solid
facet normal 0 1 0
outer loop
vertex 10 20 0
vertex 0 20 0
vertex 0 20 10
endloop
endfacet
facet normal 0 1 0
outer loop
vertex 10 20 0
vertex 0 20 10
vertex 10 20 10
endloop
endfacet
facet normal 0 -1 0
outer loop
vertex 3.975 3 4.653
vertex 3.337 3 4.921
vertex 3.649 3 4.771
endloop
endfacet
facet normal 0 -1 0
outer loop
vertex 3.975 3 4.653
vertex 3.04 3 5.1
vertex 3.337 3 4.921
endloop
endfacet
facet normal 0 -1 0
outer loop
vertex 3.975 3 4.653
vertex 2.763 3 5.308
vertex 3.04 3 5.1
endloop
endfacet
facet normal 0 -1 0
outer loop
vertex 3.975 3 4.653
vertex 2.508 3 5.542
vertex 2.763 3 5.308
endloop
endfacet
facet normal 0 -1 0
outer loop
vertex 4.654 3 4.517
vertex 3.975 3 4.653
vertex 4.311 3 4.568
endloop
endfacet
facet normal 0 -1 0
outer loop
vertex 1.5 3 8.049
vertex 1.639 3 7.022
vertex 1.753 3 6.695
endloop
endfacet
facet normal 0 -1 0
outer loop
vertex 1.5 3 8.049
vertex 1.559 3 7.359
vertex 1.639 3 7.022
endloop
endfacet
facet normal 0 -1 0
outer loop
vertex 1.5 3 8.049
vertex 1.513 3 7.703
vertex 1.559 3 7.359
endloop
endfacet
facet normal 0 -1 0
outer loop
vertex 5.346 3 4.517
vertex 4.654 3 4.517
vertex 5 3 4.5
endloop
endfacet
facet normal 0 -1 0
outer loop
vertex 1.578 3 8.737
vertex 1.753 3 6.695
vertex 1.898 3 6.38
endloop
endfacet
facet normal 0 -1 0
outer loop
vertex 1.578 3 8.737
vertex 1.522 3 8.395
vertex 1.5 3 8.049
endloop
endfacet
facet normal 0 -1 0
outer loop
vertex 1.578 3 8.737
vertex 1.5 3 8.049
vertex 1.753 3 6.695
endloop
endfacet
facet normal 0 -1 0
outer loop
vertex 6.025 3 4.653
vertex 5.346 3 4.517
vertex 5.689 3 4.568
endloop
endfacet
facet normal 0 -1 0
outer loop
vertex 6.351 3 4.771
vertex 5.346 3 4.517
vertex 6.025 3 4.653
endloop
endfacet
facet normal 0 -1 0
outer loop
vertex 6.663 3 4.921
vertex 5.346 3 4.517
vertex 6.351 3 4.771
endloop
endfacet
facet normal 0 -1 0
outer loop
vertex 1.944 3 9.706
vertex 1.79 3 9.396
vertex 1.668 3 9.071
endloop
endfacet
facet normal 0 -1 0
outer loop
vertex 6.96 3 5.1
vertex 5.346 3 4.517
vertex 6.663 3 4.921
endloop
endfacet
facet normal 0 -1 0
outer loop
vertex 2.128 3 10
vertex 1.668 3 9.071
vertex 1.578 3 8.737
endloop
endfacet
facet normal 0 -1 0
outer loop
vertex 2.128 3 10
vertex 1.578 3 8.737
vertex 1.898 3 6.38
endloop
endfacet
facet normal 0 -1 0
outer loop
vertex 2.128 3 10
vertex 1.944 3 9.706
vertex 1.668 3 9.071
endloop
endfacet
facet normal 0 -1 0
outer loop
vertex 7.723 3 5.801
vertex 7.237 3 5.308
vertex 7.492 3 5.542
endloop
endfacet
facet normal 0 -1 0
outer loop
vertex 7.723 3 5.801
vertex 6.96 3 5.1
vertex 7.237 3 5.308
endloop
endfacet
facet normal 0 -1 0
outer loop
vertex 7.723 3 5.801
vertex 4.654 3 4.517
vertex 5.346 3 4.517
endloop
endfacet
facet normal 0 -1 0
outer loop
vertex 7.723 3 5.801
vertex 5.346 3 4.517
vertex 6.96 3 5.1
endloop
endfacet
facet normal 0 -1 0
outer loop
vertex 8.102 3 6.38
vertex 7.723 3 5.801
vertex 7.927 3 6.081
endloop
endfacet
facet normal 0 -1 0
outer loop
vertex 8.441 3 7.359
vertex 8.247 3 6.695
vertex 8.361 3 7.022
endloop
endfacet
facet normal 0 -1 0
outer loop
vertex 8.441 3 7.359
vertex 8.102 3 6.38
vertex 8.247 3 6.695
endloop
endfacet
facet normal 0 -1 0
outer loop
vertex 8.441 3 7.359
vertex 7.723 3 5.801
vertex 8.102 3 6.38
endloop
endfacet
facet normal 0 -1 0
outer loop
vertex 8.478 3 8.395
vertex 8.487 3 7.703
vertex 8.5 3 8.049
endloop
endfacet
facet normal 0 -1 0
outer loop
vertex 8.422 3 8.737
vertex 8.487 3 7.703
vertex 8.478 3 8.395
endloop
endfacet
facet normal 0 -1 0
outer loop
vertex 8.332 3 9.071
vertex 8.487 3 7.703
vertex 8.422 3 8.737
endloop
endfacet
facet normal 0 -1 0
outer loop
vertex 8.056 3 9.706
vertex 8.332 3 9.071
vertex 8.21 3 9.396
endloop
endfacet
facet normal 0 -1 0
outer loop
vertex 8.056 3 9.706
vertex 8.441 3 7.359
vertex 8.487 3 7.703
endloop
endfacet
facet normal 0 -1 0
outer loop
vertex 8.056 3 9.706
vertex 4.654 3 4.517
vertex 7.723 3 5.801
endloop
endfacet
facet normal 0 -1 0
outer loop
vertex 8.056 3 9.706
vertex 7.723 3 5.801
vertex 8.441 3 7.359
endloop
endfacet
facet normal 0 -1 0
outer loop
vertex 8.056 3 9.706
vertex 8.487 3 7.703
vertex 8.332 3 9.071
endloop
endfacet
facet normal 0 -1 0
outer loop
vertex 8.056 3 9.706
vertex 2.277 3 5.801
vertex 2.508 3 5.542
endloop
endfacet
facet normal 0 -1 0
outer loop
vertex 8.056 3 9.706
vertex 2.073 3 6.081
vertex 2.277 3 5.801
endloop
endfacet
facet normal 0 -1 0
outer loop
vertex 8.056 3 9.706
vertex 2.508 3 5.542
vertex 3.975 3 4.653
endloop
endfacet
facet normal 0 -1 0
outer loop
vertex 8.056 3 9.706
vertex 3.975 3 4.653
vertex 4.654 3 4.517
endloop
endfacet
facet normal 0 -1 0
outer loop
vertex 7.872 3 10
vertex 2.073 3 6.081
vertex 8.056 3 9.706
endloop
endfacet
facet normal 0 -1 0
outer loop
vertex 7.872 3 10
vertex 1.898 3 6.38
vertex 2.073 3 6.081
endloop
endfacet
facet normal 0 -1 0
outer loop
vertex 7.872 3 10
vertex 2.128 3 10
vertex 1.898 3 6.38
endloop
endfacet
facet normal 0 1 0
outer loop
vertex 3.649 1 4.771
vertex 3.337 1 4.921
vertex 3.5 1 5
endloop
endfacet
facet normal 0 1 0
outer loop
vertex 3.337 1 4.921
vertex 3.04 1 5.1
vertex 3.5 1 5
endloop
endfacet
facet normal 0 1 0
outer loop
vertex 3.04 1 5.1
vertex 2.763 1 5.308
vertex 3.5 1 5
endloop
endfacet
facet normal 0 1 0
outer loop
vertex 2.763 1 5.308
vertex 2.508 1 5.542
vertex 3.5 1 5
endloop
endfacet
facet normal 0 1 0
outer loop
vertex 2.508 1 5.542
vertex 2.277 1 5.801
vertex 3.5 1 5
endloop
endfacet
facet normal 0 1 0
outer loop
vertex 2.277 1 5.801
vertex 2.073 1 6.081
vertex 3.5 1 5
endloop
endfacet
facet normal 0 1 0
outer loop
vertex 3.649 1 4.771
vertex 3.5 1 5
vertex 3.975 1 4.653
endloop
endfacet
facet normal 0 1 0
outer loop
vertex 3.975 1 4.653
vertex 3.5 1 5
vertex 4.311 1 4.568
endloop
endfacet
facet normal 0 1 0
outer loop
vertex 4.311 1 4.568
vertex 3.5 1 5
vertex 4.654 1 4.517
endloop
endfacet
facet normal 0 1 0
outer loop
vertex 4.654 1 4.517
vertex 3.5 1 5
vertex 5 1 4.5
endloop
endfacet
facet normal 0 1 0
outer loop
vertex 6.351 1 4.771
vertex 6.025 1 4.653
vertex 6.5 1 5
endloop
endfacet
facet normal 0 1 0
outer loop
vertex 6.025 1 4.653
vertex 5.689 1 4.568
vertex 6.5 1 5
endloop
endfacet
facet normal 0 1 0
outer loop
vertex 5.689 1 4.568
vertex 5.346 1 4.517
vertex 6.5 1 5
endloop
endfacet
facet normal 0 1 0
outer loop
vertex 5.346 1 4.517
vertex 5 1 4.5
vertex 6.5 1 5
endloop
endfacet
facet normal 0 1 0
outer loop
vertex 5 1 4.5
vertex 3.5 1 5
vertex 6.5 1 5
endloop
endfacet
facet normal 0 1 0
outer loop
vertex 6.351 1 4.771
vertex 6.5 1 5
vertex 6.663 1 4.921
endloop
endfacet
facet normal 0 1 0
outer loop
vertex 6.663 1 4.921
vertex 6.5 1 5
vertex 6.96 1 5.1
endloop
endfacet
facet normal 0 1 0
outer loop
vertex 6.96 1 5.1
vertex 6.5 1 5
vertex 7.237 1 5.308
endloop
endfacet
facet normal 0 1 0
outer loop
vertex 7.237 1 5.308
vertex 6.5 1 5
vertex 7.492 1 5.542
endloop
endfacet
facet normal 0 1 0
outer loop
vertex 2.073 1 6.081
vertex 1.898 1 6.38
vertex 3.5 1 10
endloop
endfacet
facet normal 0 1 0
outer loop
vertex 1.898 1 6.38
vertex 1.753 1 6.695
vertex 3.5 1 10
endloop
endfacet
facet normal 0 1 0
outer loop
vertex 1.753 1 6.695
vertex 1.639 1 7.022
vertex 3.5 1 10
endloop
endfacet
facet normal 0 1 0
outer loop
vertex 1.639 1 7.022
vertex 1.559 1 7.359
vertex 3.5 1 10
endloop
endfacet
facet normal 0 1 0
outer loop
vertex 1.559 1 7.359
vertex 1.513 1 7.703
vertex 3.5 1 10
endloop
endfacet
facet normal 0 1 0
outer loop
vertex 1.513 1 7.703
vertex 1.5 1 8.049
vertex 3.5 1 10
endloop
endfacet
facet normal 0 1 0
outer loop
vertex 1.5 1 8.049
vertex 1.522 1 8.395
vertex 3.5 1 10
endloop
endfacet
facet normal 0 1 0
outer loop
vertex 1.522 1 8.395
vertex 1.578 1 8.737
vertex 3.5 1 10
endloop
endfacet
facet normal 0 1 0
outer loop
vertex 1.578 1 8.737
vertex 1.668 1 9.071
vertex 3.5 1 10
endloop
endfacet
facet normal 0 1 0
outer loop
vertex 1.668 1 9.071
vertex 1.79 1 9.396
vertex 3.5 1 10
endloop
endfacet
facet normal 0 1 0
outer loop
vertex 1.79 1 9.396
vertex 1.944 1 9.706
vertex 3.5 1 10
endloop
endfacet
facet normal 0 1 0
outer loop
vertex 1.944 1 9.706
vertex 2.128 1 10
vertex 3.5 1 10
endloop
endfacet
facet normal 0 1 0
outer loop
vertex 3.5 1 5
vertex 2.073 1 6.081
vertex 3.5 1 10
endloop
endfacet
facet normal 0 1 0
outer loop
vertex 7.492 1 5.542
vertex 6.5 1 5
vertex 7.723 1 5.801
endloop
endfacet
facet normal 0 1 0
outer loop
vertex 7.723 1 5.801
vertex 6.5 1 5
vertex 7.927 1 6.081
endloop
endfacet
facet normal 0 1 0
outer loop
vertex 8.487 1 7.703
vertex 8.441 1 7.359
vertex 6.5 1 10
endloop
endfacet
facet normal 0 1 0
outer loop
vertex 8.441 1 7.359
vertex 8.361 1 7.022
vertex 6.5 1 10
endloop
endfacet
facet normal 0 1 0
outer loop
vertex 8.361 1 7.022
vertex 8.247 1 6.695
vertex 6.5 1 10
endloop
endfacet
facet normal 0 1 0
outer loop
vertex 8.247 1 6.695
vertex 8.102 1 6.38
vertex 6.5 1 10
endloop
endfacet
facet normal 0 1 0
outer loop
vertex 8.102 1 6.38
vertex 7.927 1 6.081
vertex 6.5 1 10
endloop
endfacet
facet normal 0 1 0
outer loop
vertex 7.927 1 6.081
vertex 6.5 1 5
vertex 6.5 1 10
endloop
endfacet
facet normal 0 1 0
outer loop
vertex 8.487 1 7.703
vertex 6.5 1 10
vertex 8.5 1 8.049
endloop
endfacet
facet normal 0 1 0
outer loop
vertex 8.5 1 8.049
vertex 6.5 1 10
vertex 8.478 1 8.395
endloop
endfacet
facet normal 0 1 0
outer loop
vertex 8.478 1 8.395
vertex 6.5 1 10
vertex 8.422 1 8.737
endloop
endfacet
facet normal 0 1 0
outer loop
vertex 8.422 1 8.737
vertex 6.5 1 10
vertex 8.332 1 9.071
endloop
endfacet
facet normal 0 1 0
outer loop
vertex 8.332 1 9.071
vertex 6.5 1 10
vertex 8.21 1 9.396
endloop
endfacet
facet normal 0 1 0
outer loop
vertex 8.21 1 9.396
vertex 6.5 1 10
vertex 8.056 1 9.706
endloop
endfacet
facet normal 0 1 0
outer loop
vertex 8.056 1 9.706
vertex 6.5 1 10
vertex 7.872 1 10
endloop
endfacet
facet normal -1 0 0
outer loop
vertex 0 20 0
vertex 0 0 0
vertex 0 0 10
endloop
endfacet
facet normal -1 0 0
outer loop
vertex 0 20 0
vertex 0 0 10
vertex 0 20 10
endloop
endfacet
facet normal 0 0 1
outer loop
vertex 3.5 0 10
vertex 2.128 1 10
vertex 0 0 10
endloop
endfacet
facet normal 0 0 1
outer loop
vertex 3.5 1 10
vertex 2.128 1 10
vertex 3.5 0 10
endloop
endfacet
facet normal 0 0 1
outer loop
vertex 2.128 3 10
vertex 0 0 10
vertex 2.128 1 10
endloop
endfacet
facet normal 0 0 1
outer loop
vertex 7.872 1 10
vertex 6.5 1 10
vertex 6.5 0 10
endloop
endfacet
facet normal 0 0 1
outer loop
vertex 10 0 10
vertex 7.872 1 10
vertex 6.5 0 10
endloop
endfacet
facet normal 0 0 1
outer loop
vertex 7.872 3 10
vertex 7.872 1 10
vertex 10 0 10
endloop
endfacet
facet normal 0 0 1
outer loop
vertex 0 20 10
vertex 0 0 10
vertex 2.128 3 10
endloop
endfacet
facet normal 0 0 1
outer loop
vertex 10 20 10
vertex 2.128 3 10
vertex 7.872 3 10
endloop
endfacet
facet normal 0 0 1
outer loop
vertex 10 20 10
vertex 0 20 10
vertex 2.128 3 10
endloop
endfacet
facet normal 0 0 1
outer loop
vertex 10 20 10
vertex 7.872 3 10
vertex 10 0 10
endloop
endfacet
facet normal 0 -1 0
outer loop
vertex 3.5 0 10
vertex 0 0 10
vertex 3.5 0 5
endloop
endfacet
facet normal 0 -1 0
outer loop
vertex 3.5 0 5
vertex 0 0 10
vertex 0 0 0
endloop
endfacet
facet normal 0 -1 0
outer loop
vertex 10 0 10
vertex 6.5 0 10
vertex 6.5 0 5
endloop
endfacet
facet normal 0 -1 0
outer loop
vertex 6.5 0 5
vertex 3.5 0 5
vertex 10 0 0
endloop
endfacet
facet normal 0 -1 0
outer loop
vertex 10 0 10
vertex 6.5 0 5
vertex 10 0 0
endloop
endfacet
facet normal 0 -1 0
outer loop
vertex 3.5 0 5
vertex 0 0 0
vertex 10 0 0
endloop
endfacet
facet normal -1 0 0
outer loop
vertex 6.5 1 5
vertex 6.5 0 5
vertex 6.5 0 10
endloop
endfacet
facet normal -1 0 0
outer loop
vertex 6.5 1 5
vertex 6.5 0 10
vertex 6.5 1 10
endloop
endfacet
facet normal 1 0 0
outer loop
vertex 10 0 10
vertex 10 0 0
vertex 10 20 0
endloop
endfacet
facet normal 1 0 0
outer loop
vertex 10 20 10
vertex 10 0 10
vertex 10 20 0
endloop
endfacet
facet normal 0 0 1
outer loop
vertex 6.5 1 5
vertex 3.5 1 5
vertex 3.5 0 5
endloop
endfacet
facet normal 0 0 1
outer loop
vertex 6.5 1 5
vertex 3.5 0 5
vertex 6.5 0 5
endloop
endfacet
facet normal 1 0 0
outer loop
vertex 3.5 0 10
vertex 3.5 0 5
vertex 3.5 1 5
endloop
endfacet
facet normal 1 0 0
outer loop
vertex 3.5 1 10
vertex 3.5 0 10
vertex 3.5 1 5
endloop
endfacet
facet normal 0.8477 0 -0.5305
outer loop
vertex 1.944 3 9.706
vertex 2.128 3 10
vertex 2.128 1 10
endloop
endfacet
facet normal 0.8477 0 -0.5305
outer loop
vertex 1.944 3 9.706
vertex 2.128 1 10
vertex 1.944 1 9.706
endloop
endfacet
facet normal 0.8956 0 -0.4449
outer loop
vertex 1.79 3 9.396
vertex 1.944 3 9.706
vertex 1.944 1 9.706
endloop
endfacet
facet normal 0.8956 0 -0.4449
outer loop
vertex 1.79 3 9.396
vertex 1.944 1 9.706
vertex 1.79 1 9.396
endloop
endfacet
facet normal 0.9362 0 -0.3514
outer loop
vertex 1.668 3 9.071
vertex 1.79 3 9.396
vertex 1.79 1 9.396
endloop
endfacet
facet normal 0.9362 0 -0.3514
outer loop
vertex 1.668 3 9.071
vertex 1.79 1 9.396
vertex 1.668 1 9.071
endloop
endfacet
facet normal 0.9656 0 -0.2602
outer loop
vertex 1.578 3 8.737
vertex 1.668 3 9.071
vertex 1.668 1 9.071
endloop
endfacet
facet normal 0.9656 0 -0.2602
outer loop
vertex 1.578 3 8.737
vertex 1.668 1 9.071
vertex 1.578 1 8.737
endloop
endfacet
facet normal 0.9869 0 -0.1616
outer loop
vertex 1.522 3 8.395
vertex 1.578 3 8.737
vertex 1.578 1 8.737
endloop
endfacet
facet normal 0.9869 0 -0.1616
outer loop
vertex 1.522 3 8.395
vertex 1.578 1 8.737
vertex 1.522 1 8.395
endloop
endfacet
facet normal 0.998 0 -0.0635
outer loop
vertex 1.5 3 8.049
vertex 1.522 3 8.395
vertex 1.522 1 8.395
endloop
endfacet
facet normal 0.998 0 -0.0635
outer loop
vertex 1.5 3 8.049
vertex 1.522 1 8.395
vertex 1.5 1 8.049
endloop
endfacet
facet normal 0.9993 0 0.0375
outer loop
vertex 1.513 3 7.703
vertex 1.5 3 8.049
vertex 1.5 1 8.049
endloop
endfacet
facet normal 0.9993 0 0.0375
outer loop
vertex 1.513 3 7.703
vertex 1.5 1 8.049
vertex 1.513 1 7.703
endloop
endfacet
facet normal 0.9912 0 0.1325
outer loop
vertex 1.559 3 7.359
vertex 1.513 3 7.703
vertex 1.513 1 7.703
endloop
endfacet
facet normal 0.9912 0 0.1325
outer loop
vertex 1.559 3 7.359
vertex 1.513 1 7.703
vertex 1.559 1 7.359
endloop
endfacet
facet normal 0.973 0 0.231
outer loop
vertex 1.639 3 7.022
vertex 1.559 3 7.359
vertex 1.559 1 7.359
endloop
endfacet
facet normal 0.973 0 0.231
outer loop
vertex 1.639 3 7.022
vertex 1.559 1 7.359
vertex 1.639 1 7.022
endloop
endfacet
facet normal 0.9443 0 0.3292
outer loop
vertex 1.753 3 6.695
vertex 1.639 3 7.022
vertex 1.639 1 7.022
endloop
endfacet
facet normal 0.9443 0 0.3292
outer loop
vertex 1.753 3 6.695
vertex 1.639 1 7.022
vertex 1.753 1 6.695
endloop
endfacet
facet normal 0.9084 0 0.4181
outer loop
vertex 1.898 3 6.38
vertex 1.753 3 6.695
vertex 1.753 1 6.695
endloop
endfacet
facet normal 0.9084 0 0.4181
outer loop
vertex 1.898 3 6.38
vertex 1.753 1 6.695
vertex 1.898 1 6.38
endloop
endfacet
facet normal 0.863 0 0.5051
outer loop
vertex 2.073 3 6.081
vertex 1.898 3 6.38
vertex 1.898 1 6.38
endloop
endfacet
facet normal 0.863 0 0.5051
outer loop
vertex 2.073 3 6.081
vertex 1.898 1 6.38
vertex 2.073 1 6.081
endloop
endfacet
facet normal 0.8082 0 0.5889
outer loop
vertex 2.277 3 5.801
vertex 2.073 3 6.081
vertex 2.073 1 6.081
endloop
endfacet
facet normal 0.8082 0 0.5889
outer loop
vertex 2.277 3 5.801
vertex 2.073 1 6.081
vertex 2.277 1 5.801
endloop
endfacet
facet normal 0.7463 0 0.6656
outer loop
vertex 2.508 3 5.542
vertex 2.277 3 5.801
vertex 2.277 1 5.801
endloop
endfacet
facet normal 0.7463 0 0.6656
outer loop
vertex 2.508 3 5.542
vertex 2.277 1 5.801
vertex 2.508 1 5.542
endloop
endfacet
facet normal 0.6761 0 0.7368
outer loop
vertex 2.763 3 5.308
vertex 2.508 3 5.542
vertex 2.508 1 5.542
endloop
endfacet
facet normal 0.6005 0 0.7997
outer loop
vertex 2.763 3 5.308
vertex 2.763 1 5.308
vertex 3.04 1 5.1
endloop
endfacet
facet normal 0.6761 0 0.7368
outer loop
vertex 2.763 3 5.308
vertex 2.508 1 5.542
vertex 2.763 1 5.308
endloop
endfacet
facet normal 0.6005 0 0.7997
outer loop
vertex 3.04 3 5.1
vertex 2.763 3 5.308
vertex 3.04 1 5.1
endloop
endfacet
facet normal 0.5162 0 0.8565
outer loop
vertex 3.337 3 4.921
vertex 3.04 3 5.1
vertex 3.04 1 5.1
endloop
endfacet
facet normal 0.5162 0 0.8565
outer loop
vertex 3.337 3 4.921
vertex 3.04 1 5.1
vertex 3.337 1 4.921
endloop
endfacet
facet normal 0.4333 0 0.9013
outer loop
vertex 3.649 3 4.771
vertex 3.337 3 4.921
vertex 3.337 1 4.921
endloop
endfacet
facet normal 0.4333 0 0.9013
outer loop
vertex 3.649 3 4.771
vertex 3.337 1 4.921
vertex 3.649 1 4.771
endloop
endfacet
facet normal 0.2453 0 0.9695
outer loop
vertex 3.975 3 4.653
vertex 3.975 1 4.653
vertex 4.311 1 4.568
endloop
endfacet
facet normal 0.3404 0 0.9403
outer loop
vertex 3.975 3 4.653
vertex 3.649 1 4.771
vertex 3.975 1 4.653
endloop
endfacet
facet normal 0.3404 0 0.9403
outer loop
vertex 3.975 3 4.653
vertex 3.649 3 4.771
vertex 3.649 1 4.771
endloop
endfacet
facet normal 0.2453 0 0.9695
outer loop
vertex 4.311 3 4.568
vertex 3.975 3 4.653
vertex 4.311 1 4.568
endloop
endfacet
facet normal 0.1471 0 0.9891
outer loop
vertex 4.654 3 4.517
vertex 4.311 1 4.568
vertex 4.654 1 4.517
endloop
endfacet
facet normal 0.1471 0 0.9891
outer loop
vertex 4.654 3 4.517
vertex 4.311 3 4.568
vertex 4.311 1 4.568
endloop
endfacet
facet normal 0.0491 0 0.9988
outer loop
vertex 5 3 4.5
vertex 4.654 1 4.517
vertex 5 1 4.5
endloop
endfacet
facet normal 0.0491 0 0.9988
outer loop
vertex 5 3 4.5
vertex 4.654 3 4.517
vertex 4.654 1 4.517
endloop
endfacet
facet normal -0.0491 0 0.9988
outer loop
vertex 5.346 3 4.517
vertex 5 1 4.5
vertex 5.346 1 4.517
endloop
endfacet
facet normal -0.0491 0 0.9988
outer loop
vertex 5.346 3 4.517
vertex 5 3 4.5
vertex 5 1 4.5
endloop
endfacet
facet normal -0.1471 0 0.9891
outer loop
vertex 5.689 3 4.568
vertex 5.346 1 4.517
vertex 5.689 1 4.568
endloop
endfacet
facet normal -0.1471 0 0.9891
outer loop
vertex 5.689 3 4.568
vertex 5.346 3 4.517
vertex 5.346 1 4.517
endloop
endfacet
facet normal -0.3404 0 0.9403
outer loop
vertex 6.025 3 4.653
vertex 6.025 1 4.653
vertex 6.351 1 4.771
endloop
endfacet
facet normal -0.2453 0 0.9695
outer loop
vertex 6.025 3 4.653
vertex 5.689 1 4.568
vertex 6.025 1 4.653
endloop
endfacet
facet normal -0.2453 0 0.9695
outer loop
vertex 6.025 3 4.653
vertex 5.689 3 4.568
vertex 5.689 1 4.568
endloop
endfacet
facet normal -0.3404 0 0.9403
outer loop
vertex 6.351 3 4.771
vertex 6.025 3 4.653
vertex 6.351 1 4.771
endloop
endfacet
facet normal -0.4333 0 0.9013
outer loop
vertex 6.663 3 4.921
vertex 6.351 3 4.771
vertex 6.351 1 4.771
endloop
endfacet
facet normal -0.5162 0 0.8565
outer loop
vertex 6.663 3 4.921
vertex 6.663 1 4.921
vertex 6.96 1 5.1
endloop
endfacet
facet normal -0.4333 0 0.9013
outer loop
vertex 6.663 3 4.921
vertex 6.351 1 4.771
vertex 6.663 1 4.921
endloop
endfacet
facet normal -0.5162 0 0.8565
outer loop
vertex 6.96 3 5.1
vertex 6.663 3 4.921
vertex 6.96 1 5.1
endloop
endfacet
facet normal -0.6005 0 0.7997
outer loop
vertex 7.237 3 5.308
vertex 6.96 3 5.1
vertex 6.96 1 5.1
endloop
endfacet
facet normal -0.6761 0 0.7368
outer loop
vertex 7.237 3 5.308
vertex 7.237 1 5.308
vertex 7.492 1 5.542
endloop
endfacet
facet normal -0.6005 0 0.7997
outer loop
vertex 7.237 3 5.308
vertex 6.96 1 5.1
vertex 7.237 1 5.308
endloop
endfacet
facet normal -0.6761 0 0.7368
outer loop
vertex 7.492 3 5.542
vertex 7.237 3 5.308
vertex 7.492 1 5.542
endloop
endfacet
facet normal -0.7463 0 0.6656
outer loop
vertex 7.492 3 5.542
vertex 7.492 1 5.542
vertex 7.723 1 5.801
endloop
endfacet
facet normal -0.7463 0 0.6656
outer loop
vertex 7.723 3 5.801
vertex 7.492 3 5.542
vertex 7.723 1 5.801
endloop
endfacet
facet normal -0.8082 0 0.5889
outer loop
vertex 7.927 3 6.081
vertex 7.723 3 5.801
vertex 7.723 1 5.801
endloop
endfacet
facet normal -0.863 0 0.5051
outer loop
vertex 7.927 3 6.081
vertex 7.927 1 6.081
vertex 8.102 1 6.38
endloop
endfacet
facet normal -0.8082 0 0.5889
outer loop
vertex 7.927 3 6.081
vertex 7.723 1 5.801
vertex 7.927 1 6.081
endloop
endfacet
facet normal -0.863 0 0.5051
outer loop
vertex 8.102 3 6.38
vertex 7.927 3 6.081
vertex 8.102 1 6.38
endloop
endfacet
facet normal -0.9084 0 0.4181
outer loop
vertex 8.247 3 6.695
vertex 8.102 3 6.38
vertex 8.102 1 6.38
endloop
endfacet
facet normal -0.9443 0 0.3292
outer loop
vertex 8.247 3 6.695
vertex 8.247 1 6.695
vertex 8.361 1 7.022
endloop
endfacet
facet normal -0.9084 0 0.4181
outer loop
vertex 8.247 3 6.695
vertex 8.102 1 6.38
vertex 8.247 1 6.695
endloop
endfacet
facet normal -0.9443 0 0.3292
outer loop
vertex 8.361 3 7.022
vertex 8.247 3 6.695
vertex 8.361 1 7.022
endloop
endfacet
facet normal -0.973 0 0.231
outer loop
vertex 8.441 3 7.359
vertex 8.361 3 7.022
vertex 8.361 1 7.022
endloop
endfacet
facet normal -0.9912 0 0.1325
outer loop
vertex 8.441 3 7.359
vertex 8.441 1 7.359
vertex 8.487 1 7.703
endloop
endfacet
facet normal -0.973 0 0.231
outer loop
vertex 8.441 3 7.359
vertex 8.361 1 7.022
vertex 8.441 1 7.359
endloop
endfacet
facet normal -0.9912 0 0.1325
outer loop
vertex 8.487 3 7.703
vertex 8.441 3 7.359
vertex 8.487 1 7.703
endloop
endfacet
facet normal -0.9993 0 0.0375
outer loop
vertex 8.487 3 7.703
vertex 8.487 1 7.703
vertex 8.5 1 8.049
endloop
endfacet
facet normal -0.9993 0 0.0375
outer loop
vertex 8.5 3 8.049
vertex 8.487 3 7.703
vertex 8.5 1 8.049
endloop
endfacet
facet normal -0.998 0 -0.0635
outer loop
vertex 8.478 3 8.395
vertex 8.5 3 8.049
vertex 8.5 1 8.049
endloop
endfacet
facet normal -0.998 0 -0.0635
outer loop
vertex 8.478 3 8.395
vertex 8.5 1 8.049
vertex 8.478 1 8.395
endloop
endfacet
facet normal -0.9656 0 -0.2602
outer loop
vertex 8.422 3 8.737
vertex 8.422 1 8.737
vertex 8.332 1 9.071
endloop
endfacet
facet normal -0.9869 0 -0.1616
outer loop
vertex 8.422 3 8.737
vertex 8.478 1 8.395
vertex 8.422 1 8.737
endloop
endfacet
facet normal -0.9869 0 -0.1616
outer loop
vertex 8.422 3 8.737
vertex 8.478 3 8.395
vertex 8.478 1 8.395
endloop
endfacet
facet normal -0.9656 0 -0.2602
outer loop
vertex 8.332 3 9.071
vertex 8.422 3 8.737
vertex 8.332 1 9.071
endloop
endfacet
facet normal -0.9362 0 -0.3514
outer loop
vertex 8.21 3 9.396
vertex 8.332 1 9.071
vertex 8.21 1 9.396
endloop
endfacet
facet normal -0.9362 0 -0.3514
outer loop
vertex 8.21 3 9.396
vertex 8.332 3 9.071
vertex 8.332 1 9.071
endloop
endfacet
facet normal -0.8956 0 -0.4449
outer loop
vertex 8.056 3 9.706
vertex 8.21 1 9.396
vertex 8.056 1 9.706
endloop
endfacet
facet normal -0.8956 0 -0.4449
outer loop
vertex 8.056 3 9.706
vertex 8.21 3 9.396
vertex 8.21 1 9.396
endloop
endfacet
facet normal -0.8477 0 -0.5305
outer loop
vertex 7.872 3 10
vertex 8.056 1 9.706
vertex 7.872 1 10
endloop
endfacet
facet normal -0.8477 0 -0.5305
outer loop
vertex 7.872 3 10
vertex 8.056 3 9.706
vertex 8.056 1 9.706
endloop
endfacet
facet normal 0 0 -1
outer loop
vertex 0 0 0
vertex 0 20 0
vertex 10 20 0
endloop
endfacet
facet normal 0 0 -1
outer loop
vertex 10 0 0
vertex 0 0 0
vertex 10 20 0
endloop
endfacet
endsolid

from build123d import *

# Parameters (mm, degrees)
BOX001_W            = 3
BOX001_H            = 1
BOX001_DEPTH        = 5
CYLINDER_R          = 3.5
CYLINDER_DEPTH      = 2
CYLINDER_ROLL_ANGLE = 90
BOX_W               = 10
BOX_H               = 20
BOX_DEPTH           = 10


with BuildPart() as cube:
    # Box001 → Box001 (new body)
    with BuildSketch(Plane(origin=(3.5, 0, 5), x_dir=(1, 0, 0), z_dir=(0, 0, 1))):
        with Locations((1.5, 0.5)):
            Rectangle(BOX001_W, BOX001_H)
    extrude(amount=BOX001_DEPTH)


with BuildPart() as solenoid_head_slot:
    # Cylinder → Cylinder (new body)
    with BuildSketch(Plane.XY):
        Circle(CYLINDER_R)
    extrude(amount=CYLINDER_DEPTH)


with BuildPart() as solenoid_head_slot_1:
    # Cylinder roll: moved
    add(solenoid_head_slot.part.rotate(Axis((0, 0, 0), (1, 0, 0)), CYLINDER_ROLL_ANGLE))


with BuildPart() as solenoid_head_slot_2:
    # Cylinder placement: moved
    add(solenoid_head_slot_1.part.moved(Location((5, 3, 8))))


with BuildPart() as cut001:
    # Box → Box (new body)
    with BuildSketch(Plane.XY):
        with Locations((5, 10)):
            Rectangle(BOX_W, BOX_H)
    extrude(amount=BOX_DEPTH)

    # Cut: cut solenoid_head_slot
    add(solenoid_head_slot_2.part, mode=Mode.SUBTRACT)

    # Cut001: cut Cube
    add(cube.part, mode=Mode.SUBTRACT)


solid = cut001.part
